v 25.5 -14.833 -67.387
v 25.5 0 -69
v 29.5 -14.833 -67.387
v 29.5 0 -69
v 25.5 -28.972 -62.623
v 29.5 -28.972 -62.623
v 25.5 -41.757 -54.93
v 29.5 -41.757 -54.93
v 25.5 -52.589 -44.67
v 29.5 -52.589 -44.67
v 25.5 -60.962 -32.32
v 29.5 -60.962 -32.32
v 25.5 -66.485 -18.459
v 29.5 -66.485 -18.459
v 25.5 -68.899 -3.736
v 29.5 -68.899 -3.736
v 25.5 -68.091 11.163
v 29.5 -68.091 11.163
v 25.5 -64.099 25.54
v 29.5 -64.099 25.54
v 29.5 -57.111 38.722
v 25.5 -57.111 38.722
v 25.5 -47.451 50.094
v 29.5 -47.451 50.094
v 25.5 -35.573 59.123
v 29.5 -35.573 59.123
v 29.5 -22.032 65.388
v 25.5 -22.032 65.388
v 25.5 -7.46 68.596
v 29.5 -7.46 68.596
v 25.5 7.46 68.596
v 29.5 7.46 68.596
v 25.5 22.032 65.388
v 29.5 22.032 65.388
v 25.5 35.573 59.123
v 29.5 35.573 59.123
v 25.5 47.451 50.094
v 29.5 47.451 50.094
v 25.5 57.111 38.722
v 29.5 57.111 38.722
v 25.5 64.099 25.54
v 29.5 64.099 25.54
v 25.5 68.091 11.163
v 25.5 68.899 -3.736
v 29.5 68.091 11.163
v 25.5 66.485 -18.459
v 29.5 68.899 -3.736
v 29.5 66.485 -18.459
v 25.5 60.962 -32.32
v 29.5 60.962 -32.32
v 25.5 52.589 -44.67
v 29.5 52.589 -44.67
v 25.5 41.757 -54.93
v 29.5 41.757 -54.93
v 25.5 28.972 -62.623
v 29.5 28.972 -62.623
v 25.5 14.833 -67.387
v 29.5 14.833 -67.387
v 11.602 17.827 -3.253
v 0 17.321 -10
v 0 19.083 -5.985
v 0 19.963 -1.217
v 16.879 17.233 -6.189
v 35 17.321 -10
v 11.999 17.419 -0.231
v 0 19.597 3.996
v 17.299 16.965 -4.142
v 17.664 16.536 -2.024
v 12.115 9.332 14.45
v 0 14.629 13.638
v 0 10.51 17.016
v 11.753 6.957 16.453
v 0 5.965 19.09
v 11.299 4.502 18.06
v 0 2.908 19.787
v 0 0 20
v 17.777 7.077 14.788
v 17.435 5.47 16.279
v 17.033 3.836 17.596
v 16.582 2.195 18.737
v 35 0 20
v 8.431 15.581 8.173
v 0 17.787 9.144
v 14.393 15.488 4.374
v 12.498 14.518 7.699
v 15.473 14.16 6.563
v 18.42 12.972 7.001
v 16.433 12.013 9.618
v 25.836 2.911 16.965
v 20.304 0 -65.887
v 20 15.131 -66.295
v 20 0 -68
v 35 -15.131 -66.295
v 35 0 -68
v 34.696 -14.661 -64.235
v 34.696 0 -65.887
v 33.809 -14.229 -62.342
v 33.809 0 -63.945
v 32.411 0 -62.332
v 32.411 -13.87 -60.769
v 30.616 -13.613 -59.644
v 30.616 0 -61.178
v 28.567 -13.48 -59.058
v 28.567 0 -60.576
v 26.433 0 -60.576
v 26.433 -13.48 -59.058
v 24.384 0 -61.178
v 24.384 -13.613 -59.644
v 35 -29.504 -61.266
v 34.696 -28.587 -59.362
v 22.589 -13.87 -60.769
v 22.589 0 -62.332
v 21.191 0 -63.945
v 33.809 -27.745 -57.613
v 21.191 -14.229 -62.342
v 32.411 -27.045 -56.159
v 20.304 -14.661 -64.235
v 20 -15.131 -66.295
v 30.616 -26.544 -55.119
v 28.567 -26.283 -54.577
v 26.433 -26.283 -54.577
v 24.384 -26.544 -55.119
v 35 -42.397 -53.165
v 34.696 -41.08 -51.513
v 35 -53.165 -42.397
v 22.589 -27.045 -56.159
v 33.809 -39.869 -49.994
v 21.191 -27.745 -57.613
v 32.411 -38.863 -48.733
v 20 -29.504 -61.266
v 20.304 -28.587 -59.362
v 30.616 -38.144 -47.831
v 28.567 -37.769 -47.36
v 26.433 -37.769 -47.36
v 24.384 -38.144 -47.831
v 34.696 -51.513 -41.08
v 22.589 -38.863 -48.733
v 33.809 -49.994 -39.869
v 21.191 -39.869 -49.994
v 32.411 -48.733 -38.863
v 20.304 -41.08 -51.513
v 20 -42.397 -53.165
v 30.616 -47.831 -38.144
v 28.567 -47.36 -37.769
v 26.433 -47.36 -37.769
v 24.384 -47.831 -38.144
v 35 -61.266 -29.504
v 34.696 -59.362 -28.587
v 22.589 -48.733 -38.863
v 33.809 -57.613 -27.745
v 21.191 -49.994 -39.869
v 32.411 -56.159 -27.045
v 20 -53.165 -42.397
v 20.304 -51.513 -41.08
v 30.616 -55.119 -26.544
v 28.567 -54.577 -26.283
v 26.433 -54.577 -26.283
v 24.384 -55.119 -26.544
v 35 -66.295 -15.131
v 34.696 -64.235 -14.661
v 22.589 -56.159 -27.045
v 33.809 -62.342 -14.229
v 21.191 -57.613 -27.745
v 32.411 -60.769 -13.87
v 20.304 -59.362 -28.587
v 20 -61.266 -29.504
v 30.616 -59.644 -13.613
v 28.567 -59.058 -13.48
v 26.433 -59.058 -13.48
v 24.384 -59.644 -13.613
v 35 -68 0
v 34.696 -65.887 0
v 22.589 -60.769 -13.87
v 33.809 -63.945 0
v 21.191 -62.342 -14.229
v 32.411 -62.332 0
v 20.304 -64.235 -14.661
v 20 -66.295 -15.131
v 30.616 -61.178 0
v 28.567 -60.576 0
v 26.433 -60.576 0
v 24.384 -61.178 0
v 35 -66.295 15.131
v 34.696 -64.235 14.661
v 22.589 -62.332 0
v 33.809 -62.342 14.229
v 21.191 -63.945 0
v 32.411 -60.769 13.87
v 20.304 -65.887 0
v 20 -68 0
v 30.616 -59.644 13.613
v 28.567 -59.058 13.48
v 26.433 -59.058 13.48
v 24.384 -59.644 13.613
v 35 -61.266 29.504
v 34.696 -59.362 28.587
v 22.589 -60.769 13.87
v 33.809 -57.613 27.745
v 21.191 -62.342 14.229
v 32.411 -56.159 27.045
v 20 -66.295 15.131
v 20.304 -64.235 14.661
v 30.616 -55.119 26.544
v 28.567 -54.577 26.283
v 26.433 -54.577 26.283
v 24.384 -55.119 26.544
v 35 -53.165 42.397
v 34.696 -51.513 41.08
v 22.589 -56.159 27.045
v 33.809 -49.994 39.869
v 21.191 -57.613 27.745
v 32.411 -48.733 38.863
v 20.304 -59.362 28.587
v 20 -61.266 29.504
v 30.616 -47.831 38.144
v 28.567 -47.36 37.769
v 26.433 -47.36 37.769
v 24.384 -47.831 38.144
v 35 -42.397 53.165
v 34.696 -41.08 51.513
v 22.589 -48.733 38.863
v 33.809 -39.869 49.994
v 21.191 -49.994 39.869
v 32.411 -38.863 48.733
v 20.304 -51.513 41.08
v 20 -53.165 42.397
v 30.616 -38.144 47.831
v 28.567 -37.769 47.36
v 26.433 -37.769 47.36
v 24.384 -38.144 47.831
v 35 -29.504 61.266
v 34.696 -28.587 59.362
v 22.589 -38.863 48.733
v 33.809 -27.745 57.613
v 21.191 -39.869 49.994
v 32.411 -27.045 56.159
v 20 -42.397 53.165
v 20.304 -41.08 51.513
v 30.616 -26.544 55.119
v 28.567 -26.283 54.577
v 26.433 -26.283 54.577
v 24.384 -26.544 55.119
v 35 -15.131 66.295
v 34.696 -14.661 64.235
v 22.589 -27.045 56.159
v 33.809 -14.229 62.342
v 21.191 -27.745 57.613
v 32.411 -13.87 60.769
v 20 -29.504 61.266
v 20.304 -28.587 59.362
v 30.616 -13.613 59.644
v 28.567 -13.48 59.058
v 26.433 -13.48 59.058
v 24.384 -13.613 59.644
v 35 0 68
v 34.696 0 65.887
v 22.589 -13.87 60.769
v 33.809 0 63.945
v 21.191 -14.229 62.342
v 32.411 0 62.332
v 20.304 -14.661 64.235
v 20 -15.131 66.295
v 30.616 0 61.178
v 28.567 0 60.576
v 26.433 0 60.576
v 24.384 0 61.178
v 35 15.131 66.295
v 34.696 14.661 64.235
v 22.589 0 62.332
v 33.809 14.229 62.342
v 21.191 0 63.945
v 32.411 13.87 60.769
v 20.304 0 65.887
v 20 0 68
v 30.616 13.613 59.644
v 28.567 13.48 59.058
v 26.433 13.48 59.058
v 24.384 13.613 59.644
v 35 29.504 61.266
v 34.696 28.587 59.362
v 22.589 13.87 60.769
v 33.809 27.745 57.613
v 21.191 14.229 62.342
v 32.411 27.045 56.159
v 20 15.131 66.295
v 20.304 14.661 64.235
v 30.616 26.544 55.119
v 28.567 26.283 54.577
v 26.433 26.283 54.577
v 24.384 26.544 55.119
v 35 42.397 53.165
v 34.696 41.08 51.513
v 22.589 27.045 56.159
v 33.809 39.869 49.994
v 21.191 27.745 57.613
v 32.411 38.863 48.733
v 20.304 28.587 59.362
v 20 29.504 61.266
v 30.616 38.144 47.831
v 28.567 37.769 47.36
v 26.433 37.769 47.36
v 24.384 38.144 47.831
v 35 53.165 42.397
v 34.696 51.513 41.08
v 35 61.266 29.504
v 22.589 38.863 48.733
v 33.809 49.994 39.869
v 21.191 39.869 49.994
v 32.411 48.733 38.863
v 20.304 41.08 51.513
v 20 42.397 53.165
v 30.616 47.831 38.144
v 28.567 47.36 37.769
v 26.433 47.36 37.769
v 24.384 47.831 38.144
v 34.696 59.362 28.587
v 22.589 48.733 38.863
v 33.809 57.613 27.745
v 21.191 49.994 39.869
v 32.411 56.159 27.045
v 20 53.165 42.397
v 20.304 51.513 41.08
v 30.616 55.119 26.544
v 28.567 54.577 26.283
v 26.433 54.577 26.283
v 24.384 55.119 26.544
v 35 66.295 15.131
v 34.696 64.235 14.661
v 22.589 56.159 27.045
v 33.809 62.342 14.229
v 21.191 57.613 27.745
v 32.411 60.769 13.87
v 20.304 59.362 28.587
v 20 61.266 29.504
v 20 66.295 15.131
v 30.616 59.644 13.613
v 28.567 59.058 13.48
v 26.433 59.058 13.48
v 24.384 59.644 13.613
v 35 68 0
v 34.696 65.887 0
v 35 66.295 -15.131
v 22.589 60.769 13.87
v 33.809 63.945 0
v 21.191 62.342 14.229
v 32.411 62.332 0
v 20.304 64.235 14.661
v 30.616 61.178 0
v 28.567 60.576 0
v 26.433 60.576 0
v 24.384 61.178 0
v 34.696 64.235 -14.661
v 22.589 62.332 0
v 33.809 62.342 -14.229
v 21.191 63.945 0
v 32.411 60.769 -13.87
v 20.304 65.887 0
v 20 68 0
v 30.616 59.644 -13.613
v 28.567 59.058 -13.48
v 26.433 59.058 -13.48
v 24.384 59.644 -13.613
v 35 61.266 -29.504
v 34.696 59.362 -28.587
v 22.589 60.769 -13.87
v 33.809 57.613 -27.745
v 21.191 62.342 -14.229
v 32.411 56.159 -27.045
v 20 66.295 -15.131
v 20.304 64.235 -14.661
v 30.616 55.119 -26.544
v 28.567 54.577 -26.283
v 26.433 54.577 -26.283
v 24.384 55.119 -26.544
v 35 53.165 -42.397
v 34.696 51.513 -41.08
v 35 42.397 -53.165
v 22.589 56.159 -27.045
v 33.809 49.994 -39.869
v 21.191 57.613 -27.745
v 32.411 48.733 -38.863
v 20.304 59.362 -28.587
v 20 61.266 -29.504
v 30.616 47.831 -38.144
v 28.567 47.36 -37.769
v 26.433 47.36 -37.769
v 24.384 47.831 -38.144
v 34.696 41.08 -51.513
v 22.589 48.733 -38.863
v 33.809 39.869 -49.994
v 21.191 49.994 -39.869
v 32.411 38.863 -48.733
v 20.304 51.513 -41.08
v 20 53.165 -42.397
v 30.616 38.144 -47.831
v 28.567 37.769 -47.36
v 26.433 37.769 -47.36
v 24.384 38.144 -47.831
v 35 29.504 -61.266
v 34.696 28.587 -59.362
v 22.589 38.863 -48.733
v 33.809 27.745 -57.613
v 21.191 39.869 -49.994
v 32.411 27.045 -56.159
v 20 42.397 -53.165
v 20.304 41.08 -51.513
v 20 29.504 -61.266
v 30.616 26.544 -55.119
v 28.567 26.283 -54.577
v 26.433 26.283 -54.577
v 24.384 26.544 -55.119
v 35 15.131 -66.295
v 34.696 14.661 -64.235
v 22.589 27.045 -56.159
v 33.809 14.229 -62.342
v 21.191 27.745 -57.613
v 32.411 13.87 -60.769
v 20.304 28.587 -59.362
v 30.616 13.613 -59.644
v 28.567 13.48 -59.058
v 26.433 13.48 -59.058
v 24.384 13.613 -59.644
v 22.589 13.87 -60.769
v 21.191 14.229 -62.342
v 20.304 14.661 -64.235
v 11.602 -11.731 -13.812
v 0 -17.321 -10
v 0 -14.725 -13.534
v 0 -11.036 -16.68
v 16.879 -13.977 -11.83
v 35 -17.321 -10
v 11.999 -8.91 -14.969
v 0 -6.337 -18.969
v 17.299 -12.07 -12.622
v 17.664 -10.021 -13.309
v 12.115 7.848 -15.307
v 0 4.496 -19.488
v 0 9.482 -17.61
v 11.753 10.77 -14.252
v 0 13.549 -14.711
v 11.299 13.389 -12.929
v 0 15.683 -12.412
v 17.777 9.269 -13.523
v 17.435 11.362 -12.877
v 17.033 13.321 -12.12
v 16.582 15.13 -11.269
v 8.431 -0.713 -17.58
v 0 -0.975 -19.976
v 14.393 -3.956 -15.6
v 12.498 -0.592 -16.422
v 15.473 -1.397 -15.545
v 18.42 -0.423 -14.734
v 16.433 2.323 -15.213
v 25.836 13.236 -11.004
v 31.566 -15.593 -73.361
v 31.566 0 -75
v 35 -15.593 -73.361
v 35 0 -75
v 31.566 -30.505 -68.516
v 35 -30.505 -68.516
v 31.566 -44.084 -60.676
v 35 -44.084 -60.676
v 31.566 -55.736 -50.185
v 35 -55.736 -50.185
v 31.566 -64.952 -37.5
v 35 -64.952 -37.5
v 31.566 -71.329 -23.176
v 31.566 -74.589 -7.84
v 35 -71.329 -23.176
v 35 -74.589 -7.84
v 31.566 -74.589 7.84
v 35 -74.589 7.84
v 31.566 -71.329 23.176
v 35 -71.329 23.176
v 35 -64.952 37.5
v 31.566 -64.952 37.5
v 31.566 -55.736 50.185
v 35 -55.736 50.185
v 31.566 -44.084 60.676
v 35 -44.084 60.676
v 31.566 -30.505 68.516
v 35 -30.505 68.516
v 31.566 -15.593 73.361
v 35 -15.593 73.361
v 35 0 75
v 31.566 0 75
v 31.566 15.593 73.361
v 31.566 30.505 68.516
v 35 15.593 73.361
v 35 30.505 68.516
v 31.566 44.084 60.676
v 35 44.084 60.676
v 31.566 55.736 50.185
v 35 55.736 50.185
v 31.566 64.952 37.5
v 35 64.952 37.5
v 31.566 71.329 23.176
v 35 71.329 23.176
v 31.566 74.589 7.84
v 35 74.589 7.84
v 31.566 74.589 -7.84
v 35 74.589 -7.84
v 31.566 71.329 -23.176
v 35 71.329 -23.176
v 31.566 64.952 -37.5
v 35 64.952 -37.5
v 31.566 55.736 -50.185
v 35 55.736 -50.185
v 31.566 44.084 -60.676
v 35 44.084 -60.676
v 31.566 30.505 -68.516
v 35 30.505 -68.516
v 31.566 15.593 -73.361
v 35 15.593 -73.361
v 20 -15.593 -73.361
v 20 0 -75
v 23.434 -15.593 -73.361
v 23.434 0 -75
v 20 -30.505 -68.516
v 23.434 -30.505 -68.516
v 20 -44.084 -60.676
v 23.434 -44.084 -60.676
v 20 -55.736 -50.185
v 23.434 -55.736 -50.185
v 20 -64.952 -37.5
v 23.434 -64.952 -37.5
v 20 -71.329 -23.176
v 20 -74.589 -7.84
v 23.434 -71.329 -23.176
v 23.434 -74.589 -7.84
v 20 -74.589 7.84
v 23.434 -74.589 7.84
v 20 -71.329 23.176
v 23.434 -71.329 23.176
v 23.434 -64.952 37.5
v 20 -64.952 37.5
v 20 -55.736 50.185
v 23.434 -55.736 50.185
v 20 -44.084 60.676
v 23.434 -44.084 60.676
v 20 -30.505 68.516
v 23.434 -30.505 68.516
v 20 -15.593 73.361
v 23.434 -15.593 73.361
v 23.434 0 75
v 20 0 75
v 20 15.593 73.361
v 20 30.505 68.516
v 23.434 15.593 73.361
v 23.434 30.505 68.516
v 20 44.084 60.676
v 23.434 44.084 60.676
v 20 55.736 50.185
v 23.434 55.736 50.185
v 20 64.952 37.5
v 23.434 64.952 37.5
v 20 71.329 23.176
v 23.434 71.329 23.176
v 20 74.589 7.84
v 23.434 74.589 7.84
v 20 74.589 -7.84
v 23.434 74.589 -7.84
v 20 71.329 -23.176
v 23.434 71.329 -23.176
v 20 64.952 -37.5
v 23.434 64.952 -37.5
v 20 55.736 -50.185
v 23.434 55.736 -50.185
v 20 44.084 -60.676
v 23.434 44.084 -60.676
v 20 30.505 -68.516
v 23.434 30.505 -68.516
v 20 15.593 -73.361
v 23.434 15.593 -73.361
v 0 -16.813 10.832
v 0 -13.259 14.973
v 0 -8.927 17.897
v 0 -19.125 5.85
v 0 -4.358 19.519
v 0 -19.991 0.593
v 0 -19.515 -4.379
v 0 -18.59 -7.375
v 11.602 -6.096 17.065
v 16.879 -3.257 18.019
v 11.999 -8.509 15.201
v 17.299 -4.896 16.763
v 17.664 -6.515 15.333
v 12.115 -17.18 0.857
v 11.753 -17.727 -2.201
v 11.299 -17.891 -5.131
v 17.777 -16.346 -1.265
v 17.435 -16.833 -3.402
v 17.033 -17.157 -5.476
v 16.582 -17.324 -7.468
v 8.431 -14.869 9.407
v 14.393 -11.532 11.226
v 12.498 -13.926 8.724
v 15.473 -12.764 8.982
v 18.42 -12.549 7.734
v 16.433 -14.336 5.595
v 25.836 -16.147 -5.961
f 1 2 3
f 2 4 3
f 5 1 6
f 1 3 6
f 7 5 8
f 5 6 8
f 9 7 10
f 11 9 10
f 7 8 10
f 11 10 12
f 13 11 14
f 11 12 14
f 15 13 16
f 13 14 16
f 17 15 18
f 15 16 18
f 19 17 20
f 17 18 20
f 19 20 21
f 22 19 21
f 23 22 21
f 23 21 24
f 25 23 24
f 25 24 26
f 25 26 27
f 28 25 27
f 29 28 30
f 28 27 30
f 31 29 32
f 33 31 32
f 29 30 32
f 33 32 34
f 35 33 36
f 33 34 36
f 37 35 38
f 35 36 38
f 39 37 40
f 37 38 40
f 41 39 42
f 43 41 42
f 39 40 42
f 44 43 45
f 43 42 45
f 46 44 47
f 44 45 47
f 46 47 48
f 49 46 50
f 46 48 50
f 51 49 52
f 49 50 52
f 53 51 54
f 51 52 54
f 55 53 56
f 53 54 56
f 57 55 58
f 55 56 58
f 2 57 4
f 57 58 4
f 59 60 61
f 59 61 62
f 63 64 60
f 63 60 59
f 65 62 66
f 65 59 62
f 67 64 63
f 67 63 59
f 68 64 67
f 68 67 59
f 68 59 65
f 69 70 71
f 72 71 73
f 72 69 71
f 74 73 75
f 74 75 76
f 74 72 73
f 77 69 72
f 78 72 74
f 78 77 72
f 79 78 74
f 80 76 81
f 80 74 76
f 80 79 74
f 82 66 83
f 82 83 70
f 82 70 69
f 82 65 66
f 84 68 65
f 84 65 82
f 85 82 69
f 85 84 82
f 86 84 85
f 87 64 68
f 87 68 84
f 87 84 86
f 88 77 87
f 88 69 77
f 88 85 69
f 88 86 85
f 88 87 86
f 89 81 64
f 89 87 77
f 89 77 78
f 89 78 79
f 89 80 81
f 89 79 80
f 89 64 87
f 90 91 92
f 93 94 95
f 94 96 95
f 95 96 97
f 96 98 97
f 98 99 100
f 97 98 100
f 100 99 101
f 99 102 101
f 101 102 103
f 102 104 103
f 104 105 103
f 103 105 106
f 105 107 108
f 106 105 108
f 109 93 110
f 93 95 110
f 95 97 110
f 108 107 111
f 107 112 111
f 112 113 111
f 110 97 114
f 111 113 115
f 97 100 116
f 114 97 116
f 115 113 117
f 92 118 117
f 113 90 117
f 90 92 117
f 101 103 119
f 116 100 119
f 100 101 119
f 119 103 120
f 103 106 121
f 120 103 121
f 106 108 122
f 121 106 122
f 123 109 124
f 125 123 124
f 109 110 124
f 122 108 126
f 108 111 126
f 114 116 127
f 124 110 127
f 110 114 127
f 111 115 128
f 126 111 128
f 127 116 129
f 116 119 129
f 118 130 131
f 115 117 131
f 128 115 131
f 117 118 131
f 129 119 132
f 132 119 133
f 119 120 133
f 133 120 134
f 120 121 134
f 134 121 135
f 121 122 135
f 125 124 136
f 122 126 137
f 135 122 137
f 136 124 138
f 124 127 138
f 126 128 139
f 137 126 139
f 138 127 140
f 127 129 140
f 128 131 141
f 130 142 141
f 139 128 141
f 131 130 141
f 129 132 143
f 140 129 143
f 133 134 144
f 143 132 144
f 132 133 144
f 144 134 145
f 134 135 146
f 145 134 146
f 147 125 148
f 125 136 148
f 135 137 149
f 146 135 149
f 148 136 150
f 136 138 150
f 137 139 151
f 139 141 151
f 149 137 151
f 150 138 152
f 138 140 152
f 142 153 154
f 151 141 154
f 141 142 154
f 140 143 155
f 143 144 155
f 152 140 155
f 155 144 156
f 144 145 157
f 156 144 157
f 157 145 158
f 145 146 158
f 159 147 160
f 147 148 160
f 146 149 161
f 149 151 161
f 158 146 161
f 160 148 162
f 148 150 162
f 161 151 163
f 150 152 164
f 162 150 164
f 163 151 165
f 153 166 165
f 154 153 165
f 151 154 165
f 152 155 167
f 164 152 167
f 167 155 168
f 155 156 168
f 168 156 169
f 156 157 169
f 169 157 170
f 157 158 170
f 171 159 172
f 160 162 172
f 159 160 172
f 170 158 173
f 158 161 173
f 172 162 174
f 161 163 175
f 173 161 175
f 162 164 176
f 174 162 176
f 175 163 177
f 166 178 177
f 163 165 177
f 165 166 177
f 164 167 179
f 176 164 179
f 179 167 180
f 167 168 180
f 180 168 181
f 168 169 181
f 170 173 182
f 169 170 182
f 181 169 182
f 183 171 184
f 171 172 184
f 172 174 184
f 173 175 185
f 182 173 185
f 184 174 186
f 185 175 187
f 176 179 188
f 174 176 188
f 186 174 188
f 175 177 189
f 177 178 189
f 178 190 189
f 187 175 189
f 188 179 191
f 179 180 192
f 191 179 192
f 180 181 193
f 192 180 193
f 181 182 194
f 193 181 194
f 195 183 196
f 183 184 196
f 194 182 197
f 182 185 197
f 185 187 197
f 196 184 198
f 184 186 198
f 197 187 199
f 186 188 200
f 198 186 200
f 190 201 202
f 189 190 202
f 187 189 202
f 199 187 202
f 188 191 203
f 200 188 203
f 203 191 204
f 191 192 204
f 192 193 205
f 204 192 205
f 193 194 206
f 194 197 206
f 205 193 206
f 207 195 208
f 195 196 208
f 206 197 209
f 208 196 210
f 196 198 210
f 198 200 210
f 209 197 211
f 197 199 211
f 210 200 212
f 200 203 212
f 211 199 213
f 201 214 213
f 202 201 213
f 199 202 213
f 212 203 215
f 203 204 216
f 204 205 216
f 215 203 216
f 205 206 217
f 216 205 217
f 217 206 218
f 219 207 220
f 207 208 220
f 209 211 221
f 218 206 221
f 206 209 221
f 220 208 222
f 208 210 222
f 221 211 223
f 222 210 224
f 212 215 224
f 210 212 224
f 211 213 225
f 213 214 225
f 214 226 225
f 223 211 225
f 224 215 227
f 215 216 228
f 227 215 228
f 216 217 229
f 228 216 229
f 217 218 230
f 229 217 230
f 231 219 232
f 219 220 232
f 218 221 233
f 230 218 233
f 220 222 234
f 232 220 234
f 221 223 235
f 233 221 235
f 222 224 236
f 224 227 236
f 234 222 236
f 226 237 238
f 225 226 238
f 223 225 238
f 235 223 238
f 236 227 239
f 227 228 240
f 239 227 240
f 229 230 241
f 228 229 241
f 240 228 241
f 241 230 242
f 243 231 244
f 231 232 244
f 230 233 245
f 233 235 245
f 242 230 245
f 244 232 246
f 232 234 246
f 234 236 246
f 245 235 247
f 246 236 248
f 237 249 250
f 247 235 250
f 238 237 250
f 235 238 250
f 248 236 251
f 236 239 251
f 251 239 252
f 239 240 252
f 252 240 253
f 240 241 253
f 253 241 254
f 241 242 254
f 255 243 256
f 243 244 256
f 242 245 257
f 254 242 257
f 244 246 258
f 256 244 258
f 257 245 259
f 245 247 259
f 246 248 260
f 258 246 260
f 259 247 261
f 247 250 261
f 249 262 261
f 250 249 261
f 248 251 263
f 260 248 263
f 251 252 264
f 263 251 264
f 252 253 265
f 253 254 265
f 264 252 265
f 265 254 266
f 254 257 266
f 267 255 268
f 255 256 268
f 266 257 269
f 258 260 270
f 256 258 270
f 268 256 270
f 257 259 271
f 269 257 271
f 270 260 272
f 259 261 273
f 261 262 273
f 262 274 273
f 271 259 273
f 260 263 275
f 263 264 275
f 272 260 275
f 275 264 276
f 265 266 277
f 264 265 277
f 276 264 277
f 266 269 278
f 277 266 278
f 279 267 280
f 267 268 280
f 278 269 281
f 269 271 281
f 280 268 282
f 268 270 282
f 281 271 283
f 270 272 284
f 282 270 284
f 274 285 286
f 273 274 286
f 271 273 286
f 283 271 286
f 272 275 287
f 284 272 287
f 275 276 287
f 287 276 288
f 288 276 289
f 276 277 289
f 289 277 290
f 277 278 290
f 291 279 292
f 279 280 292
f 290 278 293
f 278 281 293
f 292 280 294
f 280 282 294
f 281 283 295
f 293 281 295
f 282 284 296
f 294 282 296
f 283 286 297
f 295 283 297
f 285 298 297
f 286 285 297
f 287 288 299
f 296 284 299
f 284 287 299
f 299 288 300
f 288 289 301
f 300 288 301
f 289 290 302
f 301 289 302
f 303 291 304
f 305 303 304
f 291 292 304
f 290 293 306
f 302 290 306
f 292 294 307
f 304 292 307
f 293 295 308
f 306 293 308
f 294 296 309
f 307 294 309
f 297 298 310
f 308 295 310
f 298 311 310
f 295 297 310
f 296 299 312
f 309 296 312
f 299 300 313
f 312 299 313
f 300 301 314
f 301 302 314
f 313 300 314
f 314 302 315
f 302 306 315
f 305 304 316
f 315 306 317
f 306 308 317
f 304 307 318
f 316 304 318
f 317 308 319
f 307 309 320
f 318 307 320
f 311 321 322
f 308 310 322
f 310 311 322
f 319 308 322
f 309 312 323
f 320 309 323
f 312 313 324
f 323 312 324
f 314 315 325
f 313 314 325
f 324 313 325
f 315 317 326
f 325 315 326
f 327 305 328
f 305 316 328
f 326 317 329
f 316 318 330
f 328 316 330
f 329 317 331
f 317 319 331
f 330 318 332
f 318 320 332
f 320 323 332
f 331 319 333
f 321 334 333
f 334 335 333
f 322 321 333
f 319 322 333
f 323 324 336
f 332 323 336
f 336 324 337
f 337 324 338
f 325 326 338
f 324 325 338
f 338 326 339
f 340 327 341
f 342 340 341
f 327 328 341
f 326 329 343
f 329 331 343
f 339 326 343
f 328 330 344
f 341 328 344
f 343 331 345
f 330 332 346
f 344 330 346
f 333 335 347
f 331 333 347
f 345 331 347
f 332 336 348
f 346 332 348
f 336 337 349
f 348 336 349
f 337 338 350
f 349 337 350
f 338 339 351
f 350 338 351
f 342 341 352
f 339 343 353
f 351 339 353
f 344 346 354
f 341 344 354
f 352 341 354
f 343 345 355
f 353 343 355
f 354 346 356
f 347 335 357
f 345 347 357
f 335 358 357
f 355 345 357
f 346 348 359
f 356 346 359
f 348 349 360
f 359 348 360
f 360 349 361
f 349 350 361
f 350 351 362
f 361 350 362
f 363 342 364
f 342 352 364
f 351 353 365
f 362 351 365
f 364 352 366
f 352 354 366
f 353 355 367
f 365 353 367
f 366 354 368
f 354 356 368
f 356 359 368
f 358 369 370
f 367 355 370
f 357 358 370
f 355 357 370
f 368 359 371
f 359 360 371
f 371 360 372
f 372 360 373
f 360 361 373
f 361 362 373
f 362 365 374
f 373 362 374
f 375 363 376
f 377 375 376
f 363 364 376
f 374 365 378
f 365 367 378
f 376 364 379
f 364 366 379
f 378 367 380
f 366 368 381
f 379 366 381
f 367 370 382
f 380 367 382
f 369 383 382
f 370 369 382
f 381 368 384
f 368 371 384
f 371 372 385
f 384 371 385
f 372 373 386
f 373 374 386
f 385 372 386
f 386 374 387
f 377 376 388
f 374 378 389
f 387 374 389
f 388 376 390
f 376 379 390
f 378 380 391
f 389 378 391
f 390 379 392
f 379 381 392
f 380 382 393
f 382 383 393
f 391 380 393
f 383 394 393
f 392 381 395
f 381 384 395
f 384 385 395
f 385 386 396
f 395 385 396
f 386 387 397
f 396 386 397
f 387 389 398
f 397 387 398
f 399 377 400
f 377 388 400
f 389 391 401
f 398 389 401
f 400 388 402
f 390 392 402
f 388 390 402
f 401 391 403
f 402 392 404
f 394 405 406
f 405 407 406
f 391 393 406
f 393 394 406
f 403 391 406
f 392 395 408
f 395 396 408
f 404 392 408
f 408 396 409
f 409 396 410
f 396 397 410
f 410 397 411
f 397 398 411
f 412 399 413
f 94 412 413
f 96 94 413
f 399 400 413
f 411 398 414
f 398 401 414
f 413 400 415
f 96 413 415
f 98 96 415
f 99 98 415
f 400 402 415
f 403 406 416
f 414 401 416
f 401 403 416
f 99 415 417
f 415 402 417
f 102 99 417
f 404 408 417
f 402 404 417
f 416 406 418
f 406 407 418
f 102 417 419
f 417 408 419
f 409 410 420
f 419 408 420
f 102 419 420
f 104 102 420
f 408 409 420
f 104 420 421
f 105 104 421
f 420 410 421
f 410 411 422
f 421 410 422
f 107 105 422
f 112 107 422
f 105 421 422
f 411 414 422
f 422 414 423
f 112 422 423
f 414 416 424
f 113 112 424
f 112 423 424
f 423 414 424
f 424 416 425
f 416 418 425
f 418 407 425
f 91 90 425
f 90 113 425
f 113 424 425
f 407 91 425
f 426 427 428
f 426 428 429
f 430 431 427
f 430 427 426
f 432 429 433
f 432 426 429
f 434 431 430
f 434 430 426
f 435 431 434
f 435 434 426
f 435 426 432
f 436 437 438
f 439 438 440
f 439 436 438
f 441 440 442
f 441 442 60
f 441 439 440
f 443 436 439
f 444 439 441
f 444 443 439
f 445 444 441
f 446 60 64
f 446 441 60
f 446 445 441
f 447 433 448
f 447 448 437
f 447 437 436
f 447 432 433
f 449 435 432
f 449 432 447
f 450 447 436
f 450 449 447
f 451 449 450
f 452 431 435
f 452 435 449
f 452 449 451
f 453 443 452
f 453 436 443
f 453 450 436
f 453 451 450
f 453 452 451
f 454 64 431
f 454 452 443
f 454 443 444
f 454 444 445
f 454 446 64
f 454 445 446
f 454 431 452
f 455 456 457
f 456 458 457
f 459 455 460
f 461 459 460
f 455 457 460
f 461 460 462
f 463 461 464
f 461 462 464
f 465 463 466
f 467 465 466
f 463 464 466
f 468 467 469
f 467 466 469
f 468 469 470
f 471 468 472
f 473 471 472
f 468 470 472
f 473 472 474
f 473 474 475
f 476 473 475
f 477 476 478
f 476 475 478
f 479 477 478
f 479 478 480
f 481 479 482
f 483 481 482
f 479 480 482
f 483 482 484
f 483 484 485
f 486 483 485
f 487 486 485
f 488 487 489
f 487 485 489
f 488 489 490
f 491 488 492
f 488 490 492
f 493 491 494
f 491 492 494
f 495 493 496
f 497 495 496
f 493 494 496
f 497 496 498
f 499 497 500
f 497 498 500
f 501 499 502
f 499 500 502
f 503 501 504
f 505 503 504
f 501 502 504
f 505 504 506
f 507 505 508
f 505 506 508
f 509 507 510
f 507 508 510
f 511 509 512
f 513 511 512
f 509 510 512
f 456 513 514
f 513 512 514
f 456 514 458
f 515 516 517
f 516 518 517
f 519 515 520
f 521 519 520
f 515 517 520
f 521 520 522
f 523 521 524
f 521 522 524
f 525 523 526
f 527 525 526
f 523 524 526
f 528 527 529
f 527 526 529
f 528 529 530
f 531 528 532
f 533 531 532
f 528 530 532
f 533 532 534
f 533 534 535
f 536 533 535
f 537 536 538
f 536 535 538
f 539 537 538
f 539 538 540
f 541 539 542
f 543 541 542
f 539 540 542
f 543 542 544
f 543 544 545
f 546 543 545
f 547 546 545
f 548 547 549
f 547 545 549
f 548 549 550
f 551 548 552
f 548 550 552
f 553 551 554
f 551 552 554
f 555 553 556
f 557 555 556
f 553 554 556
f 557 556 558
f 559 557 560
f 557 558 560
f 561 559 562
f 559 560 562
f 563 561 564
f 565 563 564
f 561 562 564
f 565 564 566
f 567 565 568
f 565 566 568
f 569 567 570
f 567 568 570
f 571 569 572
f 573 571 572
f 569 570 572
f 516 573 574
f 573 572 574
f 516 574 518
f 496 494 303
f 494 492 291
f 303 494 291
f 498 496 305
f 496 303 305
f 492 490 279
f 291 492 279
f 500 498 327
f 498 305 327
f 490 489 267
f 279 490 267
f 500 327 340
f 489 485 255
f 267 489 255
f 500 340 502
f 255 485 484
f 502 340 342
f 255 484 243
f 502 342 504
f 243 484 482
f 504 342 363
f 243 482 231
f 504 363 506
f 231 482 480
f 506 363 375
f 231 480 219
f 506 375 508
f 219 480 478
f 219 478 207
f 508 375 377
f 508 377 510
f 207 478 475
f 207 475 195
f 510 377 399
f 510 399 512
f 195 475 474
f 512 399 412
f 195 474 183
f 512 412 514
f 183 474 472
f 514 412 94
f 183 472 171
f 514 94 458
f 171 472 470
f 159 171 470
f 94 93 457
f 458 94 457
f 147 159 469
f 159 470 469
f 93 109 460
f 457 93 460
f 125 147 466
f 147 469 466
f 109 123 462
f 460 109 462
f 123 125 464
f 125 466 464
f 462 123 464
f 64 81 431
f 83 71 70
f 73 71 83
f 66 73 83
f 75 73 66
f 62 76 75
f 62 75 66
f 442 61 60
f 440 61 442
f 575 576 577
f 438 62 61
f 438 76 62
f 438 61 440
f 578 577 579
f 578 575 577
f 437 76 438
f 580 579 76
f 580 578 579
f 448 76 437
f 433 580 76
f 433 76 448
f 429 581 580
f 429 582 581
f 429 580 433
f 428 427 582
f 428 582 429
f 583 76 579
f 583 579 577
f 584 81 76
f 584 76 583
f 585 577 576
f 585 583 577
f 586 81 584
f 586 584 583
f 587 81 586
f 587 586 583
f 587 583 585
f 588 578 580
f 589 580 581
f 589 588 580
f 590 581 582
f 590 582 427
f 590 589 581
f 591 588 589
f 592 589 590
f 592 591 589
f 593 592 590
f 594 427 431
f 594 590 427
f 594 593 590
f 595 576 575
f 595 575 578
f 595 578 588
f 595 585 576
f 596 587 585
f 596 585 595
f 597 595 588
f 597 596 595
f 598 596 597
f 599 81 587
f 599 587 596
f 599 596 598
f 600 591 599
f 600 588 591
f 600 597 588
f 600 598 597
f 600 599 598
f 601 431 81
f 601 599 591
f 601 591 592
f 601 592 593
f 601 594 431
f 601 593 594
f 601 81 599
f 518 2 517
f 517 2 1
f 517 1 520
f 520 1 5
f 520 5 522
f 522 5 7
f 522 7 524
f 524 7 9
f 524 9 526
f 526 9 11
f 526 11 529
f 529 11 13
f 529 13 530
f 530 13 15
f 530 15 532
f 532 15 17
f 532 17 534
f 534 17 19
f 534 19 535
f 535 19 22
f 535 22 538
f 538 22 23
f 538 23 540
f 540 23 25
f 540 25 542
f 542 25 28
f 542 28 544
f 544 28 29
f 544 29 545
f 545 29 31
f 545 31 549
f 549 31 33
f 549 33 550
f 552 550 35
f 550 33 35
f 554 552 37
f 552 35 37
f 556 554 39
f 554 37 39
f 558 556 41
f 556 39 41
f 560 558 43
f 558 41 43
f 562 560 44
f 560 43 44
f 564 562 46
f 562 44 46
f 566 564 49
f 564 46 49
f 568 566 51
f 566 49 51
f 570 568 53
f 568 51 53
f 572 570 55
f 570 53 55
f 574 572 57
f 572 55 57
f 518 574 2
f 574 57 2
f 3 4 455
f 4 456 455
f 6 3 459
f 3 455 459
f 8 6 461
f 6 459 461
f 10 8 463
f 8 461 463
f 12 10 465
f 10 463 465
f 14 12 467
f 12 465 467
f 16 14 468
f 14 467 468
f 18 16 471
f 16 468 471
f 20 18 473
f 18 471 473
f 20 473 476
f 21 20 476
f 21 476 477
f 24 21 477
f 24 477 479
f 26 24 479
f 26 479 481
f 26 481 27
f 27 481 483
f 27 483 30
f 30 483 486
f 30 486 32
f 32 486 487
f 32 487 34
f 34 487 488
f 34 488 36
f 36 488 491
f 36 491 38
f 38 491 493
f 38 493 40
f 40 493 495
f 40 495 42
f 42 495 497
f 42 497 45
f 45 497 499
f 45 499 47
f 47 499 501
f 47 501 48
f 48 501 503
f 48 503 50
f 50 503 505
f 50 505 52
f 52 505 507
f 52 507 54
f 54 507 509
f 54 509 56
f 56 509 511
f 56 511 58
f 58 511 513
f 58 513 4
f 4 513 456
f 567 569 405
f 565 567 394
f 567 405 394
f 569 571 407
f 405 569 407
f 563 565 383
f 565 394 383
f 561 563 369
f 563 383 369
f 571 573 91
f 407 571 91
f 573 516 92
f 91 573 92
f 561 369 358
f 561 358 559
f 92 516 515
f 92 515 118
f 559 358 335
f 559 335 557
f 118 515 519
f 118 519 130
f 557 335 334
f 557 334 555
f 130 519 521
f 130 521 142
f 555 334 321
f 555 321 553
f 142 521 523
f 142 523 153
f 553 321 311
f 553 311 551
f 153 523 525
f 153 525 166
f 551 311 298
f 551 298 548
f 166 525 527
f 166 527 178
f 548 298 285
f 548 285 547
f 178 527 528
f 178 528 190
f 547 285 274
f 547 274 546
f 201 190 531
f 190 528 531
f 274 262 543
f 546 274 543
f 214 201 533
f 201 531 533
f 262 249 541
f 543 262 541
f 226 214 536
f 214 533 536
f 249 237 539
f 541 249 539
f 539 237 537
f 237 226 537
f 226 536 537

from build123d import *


with BuildPart() as part:
    # Sketch3 for Loft1 → Loft1 section 0
    with BuildSketch(Plane(origin=(0, 0, 0), x_dir=(0, 0, -1), z_dir=(1, 0, 0))):
        with BuildLine():
            # circular arc as an exact rational Bezier (weights 1, cos(half-angle), 1)
            Bezier((-20, 0), (-20.000000001, -34.641016152), (10, -17.320508076), weights=[1, 0.5, 1])
            Bezier((10, -17.320508076), (39.999999999, 0), (10, 17.320508076), weights=[1, 0.5, 1])
            Bezier((10, 17.320508076), (-20.000000001, 34.641016152), (-20, 0), weights=[1, 0.5, 1])
        make_face()
    # Sketch4 → Loft1 section 1
    with BuildSketch(Plane(origin=(35, 0, 0), x_dir=(0, 0, -1), z_dir=(1, 0, 0))):
        with BuildLine():
            Line((-20, 0), (10, -17.320508076))
            Line((10, -17.320508076), (10, 17.320508076))
            Line((10, 17.320508076), (-20, 0))
        make_face()
    loft()


with BuildPart() as body_2:
    # Sketch6 → Revolve1 (revolve)
    with BuildSketch(Plane(origin=(0, 0, 0), x_dir=(1, 0, 0), z_dir=(0, 1, 0)), mode=Mode.PRIVATE) as revolve1_sk:
        with BuildLine():
            Line((23.43403432, -75), (25.5, -69))
            Line((25.5, -69), (29.5, -69))
            Line((29.5, -69), (31.56596568, -75))
            Line((31.56596568, -75), (35, -75))
            Line((35, -75), (35, -68))
            ThreePointArc((35, -68), (27.5, -60.5), (20, -68))
            Line((20, -68), (20, -75))
            Line((20, -75), (23.43403432, -75))
        make_face()
    revolve(revolve1_sk.sketch.rotate(Axis((47.894182532, 0, 0), (-1, 0, 0)), 180), axis=Axis((47.894182532, 0, 0), (-1, 0, 0)))


solid = Compound([part.part, body_2.part])
